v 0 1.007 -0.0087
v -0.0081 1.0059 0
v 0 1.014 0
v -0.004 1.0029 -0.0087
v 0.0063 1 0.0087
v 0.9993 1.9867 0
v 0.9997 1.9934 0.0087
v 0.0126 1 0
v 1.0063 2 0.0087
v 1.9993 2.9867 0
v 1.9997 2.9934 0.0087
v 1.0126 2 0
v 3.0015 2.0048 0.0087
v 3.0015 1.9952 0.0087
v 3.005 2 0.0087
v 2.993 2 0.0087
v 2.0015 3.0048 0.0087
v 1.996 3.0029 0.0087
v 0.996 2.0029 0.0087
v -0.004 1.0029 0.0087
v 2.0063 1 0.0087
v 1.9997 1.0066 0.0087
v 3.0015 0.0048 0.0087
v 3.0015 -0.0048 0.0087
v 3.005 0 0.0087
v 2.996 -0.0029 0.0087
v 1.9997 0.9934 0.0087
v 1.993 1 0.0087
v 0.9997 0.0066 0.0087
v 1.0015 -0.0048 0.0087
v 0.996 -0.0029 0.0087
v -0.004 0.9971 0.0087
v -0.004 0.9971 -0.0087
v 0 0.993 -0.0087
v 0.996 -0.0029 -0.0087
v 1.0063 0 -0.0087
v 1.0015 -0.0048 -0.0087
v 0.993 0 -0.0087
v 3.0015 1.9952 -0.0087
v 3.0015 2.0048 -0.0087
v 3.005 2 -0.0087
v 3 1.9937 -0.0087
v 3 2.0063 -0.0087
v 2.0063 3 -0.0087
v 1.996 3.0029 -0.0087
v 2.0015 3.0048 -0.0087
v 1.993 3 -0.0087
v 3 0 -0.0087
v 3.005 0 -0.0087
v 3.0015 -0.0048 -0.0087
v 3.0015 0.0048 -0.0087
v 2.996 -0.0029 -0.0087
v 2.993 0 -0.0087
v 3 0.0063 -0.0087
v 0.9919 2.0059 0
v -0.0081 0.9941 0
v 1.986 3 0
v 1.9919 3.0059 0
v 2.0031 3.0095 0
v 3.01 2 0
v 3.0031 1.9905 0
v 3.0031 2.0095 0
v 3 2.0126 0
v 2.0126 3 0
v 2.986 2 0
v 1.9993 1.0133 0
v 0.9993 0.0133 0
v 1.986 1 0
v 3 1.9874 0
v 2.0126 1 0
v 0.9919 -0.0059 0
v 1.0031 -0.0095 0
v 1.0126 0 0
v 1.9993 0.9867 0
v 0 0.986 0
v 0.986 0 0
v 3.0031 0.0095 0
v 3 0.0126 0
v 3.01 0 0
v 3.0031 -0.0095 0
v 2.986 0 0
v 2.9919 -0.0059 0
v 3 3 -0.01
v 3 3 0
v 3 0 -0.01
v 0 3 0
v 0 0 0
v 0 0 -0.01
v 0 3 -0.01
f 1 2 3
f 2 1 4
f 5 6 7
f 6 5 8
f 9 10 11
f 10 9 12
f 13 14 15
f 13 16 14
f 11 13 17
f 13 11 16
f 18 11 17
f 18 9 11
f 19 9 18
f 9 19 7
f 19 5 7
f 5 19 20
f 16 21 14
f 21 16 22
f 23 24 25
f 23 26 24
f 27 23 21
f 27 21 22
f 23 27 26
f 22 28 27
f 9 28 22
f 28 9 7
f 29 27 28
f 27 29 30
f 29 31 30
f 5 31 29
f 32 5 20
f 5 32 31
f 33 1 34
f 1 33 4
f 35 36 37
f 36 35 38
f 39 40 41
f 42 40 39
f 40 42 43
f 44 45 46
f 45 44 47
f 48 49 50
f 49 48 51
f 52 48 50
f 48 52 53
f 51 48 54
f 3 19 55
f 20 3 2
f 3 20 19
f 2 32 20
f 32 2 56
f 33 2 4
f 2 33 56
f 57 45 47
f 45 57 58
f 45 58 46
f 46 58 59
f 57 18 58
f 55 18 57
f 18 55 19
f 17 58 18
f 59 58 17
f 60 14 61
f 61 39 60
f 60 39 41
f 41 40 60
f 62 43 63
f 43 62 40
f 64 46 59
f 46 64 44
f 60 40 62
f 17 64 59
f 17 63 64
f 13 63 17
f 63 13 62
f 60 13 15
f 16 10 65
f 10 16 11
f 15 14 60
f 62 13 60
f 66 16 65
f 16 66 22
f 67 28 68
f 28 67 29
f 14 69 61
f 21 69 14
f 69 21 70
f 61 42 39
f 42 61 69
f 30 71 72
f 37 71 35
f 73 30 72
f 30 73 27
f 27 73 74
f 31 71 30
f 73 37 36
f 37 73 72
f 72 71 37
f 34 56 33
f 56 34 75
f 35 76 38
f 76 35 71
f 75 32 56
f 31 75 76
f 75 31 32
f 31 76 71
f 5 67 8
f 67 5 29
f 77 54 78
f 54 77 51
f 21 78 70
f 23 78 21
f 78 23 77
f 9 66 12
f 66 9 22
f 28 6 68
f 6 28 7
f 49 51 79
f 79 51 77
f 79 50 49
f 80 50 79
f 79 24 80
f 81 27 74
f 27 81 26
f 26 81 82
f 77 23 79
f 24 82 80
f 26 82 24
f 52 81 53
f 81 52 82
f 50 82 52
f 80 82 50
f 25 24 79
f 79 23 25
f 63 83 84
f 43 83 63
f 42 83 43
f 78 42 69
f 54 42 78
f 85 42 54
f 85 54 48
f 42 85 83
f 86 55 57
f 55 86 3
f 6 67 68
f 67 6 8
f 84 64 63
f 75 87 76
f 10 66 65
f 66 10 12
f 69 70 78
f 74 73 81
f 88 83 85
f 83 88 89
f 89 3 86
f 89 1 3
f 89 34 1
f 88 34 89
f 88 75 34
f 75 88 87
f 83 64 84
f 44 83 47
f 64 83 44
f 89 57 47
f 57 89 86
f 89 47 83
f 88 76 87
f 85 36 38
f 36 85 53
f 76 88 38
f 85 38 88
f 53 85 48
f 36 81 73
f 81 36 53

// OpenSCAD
hull(){
    translate([0.0, 1.0]) sphere(0.01);
    translate([1.0, 2.0]) sphere(0.01);
}
hull(){
    translate([1.0, 2.0]) sphere(0.01);
    translate([2.0, 3.0]) sphere(0.01);
}
hull(){
    translate([2.0, 3.0]) sphere(0.01);
    translate([3.0, 2.0]) sphere(0.01);
}
hull(){
    translate([3.0, 2.0]) sphere(0.01);
    translate([2.0, 1.0]) sphere(0.01);
}
hull(){
    translate([2.0, 1.0]) sphere(0.01);
    translate([1.0, 0.0]) sphere(0.01);
}
hull(){
    translate([1.0, 0.0]) sphere(0.01);
    translate([0.0, 1.0]) sphere(0.01);
}
hull(){
    translate([0.0, 1.0]) sphere(0.01);
    translate([1.0, 2.0]) sphere(0.01);
}
hull(){
    translate([1.0, 2.0]) sphere(0.01);
    translate([2.0, 1.0]) sphere(0.01);
}
hull(){
    translate([2.0, 1.0]) sphere(0.01);
    translate([3.0, 0.0]) sphere(0.01);
}
hull(){
    translate([3.0, 0.0]) sphere(0.01);
    translate([2.0, 1.0]) sphere(0.01);
}
hull(){
    translate([2.0, 1.0]) sphere(0.01);
    translate([1.0, 2.0]) sphere(0.01);
}
hull(){
    translate([1.0, 2.0]) sphere(0.01);
    translate([2.0, 1.0]) sphere(0.01);
}
hull(){
    translate([2.0, 1.0]) sphere(0.01);
    translate([3.0, 2.0]) sphere(0.01);
}
hull(){
    translate([3.0, 2.0]) sphere(0.01);
    translate([2.0, 3.0]) sphere(0.01);
}
hull(){
    translate([2.0, 3.0]) sphere(0.01);
    translate([1.0, 2.0]) sphere(0.01);
}
hull(){
    translate([1.0, 2.0]) sphere(0.01);
    translate([0.0, 1.0]) sphere(0.01);
}
translate([0,0,-0.01]) color([0.1,0.1,0.1]) cube([3,3,0.01]);
